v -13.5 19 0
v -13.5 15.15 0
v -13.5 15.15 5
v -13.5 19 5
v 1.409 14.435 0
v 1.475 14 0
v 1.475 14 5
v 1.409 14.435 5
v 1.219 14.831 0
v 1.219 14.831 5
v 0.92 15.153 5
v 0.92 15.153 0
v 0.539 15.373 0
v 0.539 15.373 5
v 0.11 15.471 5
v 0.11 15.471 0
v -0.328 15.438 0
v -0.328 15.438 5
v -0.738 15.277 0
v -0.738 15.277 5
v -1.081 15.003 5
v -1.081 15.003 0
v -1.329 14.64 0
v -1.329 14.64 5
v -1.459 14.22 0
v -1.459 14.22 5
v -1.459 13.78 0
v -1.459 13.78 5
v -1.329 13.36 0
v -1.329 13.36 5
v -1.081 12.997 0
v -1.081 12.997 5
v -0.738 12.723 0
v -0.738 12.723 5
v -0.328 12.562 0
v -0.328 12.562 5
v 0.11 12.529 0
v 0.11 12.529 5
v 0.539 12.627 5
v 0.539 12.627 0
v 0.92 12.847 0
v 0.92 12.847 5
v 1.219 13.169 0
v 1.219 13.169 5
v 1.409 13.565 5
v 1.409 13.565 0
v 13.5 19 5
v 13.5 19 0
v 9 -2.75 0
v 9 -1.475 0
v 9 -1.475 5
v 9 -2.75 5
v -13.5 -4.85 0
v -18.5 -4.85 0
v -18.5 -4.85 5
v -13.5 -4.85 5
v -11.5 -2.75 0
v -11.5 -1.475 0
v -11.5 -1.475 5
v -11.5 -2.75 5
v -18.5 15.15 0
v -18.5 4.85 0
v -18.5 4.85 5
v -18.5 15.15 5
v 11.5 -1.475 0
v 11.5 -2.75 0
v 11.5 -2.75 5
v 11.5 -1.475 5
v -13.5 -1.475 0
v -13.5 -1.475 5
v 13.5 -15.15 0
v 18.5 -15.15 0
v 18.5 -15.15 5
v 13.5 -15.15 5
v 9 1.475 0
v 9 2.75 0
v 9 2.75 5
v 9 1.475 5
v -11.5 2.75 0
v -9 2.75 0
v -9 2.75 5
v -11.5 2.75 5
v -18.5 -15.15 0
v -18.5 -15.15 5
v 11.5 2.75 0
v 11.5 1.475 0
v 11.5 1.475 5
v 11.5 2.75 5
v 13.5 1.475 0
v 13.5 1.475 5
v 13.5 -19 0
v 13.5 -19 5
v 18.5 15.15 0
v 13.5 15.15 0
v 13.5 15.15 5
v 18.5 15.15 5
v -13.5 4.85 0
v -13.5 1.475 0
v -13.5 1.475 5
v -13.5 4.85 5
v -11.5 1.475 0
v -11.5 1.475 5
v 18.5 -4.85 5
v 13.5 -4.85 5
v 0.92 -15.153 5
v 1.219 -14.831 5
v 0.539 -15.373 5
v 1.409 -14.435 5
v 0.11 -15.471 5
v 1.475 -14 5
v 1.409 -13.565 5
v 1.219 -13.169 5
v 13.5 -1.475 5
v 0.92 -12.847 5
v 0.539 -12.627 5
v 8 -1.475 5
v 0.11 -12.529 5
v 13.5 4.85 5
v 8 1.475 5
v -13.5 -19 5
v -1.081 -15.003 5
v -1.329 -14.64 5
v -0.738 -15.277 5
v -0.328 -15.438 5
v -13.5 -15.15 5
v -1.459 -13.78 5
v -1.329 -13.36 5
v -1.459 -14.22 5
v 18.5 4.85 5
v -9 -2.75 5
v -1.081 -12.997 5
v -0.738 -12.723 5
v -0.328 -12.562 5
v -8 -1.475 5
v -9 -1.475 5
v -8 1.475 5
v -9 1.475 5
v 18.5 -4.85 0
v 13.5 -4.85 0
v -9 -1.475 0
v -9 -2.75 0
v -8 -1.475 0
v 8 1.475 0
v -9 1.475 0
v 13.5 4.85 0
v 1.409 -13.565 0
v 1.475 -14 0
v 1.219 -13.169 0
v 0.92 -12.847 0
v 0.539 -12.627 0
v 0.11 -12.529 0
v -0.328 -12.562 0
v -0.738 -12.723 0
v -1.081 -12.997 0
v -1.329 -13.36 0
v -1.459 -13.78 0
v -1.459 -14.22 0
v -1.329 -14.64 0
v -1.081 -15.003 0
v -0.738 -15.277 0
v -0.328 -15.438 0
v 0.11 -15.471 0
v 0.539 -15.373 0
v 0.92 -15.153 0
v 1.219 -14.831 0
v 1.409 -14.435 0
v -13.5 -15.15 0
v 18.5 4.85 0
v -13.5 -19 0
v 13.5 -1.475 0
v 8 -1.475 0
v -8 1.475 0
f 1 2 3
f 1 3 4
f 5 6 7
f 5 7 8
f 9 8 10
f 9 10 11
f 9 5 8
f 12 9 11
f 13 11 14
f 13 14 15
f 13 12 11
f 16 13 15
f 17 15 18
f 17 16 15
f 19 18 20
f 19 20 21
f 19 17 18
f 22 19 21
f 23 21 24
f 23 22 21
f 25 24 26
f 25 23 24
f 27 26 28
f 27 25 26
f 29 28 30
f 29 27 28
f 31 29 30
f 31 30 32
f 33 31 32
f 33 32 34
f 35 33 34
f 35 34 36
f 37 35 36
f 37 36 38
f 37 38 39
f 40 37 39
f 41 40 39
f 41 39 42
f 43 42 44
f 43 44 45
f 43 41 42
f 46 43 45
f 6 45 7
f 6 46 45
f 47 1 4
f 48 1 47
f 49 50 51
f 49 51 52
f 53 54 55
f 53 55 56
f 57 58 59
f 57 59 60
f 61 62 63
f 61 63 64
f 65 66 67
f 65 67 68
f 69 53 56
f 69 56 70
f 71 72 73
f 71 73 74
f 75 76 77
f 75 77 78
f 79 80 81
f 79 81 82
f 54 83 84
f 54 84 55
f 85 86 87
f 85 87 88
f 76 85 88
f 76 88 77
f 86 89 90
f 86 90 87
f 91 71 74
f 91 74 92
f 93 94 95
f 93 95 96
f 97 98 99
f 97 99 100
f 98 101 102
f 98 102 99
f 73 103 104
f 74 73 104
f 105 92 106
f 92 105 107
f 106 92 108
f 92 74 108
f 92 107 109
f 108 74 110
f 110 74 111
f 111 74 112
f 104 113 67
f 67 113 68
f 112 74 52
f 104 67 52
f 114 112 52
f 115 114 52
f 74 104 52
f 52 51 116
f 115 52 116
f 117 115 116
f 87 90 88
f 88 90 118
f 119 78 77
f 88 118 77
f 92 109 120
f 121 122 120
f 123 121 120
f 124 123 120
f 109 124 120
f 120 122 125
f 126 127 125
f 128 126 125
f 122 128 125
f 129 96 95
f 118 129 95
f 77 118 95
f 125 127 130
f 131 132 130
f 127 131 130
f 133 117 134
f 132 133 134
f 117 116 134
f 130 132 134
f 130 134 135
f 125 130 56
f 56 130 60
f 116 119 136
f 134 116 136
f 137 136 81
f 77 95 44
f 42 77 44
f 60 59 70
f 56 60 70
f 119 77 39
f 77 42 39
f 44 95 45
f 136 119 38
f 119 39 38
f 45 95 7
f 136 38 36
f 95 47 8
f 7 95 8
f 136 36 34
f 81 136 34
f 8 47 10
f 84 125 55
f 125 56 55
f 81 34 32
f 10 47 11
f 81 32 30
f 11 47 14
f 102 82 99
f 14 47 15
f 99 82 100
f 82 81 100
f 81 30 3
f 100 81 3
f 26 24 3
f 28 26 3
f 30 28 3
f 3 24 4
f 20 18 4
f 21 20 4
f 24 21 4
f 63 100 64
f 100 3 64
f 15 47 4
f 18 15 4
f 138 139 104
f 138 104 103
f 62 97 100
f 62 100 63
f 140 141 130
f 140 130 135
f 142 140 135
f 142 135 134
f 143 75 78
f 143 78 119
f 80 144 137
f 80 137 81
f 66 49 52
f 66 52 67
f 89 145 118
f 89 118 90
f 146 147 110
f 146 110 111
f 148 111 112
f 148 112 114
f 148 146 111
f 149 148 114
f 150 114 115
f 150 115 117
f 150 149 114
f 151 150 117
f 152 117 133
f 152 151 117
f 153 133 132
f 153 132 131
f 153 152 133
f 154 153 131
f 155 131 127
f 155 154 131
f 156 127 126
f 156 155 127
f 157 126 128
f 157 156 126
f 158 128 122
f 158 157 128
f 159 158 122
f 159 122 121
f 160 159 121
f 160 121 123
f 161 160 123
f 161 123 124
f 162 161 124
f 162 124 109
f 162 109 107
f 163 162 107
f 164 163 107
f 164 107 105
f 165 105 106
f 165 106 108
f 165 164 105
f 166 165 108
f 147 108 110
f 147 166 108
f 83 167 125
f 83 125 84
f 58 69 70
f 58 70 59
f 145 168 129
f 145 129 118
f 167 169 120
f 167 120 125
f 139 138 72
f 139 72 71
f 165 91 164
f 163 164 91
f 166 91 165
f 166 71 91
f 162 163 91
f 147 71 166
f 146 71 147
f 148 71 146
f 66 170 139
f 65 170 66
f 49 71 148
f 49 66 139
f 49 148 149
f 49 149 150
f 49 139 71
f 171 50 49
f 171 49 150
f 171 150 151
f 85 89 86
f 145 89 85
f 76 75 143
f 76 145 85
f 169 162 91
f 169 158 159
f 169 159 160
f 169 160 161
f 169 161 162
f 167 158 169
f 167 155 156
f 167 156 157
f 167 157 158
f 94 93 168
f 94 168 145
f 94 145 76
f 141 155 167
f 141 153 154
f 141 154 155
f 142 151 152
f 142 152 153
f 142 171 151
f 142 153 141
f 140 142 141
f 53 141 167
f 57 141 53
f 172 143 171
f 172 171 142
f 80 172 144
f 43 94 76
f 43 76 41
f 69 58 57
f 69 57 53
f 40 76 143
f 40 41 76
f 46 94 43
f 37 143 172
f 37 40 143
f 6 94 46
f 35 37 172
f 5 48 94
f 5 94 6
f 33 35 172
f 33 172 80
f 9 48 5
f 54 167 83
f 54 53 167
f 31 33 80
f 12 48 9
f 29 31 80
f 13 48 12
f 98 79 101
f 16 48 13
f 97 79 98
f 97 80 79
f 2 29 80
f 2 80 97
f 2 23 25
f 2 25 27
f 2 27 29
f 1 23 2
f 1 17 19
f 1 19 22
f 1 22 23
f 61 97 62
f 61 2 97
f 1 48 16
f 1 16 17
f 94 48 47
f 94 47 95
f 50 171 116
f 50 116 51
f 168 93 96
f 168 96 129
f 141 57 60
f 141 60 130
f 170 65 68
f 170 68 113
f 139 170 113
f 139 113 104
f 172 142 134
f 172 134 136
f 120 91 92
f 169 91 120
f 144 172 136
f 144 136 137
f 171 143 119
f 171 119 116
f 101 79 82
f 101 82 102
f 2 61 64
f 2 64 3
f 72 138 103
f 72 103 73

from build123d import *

# Parameters (mm, degrees)
SKETCH1_R           = 1.475
BOSS_EXTRUDE1_DEPTH = 5


with BuildPart() as part:
    # Sketch1 → Boss-Extrude1 (new body)
    with BuildSketch(Plane.XY):
        Polygon((-13.5, 19), (13.5, 19), (13.5, 15.15), (18.5, 15.15), (18.5, 4.85), (13.5, 4.85), (13.5, 1.475), (11.5, 1.475), (11.5, 2.75), (9, 2.75), (9, 1.475), (8, 1.475), (8, -1.475), (9, -1.475), (9, -2.75), (11.5, -2.75), (11.5, -1.475), (13.5, -1.475), (13.5, -4.85), (18.5, -4.85), (18.5, -15.15), (13.5, -15.15), (13.5, -19), (-13.5, -19), (-13.5, -15.15), (-18.5, -15.15), (-18.5, -4.85), (-13.5, -4.85), (-13.5, -1.475), (-11.5, -1.475), (-11.5, -2.75), (-9, -2.75), (-9, -1.475), (-8, -1.475), (-8, 1.475), (-9, 1.475), (-9, 2.75), (-11.5, 2.75), (-11.5, 1.475), (-13.5, 1.475), (-13.5, 4.85), (-18.5, 4.85), (-18.5, 15.15), (-13.5, 15.15), align=None)
        with Locations((0, 14)):
            Circle(SKETCH1_R, mode=Mode.SUBTRACT)
        with Locations((0, -14)):
            Circle(SKETCH1_R, mode=Mode.SUBTRACT)
    extrude(amount=BOSS_EXTRUDE1_DEPTH)


solid = part.part
